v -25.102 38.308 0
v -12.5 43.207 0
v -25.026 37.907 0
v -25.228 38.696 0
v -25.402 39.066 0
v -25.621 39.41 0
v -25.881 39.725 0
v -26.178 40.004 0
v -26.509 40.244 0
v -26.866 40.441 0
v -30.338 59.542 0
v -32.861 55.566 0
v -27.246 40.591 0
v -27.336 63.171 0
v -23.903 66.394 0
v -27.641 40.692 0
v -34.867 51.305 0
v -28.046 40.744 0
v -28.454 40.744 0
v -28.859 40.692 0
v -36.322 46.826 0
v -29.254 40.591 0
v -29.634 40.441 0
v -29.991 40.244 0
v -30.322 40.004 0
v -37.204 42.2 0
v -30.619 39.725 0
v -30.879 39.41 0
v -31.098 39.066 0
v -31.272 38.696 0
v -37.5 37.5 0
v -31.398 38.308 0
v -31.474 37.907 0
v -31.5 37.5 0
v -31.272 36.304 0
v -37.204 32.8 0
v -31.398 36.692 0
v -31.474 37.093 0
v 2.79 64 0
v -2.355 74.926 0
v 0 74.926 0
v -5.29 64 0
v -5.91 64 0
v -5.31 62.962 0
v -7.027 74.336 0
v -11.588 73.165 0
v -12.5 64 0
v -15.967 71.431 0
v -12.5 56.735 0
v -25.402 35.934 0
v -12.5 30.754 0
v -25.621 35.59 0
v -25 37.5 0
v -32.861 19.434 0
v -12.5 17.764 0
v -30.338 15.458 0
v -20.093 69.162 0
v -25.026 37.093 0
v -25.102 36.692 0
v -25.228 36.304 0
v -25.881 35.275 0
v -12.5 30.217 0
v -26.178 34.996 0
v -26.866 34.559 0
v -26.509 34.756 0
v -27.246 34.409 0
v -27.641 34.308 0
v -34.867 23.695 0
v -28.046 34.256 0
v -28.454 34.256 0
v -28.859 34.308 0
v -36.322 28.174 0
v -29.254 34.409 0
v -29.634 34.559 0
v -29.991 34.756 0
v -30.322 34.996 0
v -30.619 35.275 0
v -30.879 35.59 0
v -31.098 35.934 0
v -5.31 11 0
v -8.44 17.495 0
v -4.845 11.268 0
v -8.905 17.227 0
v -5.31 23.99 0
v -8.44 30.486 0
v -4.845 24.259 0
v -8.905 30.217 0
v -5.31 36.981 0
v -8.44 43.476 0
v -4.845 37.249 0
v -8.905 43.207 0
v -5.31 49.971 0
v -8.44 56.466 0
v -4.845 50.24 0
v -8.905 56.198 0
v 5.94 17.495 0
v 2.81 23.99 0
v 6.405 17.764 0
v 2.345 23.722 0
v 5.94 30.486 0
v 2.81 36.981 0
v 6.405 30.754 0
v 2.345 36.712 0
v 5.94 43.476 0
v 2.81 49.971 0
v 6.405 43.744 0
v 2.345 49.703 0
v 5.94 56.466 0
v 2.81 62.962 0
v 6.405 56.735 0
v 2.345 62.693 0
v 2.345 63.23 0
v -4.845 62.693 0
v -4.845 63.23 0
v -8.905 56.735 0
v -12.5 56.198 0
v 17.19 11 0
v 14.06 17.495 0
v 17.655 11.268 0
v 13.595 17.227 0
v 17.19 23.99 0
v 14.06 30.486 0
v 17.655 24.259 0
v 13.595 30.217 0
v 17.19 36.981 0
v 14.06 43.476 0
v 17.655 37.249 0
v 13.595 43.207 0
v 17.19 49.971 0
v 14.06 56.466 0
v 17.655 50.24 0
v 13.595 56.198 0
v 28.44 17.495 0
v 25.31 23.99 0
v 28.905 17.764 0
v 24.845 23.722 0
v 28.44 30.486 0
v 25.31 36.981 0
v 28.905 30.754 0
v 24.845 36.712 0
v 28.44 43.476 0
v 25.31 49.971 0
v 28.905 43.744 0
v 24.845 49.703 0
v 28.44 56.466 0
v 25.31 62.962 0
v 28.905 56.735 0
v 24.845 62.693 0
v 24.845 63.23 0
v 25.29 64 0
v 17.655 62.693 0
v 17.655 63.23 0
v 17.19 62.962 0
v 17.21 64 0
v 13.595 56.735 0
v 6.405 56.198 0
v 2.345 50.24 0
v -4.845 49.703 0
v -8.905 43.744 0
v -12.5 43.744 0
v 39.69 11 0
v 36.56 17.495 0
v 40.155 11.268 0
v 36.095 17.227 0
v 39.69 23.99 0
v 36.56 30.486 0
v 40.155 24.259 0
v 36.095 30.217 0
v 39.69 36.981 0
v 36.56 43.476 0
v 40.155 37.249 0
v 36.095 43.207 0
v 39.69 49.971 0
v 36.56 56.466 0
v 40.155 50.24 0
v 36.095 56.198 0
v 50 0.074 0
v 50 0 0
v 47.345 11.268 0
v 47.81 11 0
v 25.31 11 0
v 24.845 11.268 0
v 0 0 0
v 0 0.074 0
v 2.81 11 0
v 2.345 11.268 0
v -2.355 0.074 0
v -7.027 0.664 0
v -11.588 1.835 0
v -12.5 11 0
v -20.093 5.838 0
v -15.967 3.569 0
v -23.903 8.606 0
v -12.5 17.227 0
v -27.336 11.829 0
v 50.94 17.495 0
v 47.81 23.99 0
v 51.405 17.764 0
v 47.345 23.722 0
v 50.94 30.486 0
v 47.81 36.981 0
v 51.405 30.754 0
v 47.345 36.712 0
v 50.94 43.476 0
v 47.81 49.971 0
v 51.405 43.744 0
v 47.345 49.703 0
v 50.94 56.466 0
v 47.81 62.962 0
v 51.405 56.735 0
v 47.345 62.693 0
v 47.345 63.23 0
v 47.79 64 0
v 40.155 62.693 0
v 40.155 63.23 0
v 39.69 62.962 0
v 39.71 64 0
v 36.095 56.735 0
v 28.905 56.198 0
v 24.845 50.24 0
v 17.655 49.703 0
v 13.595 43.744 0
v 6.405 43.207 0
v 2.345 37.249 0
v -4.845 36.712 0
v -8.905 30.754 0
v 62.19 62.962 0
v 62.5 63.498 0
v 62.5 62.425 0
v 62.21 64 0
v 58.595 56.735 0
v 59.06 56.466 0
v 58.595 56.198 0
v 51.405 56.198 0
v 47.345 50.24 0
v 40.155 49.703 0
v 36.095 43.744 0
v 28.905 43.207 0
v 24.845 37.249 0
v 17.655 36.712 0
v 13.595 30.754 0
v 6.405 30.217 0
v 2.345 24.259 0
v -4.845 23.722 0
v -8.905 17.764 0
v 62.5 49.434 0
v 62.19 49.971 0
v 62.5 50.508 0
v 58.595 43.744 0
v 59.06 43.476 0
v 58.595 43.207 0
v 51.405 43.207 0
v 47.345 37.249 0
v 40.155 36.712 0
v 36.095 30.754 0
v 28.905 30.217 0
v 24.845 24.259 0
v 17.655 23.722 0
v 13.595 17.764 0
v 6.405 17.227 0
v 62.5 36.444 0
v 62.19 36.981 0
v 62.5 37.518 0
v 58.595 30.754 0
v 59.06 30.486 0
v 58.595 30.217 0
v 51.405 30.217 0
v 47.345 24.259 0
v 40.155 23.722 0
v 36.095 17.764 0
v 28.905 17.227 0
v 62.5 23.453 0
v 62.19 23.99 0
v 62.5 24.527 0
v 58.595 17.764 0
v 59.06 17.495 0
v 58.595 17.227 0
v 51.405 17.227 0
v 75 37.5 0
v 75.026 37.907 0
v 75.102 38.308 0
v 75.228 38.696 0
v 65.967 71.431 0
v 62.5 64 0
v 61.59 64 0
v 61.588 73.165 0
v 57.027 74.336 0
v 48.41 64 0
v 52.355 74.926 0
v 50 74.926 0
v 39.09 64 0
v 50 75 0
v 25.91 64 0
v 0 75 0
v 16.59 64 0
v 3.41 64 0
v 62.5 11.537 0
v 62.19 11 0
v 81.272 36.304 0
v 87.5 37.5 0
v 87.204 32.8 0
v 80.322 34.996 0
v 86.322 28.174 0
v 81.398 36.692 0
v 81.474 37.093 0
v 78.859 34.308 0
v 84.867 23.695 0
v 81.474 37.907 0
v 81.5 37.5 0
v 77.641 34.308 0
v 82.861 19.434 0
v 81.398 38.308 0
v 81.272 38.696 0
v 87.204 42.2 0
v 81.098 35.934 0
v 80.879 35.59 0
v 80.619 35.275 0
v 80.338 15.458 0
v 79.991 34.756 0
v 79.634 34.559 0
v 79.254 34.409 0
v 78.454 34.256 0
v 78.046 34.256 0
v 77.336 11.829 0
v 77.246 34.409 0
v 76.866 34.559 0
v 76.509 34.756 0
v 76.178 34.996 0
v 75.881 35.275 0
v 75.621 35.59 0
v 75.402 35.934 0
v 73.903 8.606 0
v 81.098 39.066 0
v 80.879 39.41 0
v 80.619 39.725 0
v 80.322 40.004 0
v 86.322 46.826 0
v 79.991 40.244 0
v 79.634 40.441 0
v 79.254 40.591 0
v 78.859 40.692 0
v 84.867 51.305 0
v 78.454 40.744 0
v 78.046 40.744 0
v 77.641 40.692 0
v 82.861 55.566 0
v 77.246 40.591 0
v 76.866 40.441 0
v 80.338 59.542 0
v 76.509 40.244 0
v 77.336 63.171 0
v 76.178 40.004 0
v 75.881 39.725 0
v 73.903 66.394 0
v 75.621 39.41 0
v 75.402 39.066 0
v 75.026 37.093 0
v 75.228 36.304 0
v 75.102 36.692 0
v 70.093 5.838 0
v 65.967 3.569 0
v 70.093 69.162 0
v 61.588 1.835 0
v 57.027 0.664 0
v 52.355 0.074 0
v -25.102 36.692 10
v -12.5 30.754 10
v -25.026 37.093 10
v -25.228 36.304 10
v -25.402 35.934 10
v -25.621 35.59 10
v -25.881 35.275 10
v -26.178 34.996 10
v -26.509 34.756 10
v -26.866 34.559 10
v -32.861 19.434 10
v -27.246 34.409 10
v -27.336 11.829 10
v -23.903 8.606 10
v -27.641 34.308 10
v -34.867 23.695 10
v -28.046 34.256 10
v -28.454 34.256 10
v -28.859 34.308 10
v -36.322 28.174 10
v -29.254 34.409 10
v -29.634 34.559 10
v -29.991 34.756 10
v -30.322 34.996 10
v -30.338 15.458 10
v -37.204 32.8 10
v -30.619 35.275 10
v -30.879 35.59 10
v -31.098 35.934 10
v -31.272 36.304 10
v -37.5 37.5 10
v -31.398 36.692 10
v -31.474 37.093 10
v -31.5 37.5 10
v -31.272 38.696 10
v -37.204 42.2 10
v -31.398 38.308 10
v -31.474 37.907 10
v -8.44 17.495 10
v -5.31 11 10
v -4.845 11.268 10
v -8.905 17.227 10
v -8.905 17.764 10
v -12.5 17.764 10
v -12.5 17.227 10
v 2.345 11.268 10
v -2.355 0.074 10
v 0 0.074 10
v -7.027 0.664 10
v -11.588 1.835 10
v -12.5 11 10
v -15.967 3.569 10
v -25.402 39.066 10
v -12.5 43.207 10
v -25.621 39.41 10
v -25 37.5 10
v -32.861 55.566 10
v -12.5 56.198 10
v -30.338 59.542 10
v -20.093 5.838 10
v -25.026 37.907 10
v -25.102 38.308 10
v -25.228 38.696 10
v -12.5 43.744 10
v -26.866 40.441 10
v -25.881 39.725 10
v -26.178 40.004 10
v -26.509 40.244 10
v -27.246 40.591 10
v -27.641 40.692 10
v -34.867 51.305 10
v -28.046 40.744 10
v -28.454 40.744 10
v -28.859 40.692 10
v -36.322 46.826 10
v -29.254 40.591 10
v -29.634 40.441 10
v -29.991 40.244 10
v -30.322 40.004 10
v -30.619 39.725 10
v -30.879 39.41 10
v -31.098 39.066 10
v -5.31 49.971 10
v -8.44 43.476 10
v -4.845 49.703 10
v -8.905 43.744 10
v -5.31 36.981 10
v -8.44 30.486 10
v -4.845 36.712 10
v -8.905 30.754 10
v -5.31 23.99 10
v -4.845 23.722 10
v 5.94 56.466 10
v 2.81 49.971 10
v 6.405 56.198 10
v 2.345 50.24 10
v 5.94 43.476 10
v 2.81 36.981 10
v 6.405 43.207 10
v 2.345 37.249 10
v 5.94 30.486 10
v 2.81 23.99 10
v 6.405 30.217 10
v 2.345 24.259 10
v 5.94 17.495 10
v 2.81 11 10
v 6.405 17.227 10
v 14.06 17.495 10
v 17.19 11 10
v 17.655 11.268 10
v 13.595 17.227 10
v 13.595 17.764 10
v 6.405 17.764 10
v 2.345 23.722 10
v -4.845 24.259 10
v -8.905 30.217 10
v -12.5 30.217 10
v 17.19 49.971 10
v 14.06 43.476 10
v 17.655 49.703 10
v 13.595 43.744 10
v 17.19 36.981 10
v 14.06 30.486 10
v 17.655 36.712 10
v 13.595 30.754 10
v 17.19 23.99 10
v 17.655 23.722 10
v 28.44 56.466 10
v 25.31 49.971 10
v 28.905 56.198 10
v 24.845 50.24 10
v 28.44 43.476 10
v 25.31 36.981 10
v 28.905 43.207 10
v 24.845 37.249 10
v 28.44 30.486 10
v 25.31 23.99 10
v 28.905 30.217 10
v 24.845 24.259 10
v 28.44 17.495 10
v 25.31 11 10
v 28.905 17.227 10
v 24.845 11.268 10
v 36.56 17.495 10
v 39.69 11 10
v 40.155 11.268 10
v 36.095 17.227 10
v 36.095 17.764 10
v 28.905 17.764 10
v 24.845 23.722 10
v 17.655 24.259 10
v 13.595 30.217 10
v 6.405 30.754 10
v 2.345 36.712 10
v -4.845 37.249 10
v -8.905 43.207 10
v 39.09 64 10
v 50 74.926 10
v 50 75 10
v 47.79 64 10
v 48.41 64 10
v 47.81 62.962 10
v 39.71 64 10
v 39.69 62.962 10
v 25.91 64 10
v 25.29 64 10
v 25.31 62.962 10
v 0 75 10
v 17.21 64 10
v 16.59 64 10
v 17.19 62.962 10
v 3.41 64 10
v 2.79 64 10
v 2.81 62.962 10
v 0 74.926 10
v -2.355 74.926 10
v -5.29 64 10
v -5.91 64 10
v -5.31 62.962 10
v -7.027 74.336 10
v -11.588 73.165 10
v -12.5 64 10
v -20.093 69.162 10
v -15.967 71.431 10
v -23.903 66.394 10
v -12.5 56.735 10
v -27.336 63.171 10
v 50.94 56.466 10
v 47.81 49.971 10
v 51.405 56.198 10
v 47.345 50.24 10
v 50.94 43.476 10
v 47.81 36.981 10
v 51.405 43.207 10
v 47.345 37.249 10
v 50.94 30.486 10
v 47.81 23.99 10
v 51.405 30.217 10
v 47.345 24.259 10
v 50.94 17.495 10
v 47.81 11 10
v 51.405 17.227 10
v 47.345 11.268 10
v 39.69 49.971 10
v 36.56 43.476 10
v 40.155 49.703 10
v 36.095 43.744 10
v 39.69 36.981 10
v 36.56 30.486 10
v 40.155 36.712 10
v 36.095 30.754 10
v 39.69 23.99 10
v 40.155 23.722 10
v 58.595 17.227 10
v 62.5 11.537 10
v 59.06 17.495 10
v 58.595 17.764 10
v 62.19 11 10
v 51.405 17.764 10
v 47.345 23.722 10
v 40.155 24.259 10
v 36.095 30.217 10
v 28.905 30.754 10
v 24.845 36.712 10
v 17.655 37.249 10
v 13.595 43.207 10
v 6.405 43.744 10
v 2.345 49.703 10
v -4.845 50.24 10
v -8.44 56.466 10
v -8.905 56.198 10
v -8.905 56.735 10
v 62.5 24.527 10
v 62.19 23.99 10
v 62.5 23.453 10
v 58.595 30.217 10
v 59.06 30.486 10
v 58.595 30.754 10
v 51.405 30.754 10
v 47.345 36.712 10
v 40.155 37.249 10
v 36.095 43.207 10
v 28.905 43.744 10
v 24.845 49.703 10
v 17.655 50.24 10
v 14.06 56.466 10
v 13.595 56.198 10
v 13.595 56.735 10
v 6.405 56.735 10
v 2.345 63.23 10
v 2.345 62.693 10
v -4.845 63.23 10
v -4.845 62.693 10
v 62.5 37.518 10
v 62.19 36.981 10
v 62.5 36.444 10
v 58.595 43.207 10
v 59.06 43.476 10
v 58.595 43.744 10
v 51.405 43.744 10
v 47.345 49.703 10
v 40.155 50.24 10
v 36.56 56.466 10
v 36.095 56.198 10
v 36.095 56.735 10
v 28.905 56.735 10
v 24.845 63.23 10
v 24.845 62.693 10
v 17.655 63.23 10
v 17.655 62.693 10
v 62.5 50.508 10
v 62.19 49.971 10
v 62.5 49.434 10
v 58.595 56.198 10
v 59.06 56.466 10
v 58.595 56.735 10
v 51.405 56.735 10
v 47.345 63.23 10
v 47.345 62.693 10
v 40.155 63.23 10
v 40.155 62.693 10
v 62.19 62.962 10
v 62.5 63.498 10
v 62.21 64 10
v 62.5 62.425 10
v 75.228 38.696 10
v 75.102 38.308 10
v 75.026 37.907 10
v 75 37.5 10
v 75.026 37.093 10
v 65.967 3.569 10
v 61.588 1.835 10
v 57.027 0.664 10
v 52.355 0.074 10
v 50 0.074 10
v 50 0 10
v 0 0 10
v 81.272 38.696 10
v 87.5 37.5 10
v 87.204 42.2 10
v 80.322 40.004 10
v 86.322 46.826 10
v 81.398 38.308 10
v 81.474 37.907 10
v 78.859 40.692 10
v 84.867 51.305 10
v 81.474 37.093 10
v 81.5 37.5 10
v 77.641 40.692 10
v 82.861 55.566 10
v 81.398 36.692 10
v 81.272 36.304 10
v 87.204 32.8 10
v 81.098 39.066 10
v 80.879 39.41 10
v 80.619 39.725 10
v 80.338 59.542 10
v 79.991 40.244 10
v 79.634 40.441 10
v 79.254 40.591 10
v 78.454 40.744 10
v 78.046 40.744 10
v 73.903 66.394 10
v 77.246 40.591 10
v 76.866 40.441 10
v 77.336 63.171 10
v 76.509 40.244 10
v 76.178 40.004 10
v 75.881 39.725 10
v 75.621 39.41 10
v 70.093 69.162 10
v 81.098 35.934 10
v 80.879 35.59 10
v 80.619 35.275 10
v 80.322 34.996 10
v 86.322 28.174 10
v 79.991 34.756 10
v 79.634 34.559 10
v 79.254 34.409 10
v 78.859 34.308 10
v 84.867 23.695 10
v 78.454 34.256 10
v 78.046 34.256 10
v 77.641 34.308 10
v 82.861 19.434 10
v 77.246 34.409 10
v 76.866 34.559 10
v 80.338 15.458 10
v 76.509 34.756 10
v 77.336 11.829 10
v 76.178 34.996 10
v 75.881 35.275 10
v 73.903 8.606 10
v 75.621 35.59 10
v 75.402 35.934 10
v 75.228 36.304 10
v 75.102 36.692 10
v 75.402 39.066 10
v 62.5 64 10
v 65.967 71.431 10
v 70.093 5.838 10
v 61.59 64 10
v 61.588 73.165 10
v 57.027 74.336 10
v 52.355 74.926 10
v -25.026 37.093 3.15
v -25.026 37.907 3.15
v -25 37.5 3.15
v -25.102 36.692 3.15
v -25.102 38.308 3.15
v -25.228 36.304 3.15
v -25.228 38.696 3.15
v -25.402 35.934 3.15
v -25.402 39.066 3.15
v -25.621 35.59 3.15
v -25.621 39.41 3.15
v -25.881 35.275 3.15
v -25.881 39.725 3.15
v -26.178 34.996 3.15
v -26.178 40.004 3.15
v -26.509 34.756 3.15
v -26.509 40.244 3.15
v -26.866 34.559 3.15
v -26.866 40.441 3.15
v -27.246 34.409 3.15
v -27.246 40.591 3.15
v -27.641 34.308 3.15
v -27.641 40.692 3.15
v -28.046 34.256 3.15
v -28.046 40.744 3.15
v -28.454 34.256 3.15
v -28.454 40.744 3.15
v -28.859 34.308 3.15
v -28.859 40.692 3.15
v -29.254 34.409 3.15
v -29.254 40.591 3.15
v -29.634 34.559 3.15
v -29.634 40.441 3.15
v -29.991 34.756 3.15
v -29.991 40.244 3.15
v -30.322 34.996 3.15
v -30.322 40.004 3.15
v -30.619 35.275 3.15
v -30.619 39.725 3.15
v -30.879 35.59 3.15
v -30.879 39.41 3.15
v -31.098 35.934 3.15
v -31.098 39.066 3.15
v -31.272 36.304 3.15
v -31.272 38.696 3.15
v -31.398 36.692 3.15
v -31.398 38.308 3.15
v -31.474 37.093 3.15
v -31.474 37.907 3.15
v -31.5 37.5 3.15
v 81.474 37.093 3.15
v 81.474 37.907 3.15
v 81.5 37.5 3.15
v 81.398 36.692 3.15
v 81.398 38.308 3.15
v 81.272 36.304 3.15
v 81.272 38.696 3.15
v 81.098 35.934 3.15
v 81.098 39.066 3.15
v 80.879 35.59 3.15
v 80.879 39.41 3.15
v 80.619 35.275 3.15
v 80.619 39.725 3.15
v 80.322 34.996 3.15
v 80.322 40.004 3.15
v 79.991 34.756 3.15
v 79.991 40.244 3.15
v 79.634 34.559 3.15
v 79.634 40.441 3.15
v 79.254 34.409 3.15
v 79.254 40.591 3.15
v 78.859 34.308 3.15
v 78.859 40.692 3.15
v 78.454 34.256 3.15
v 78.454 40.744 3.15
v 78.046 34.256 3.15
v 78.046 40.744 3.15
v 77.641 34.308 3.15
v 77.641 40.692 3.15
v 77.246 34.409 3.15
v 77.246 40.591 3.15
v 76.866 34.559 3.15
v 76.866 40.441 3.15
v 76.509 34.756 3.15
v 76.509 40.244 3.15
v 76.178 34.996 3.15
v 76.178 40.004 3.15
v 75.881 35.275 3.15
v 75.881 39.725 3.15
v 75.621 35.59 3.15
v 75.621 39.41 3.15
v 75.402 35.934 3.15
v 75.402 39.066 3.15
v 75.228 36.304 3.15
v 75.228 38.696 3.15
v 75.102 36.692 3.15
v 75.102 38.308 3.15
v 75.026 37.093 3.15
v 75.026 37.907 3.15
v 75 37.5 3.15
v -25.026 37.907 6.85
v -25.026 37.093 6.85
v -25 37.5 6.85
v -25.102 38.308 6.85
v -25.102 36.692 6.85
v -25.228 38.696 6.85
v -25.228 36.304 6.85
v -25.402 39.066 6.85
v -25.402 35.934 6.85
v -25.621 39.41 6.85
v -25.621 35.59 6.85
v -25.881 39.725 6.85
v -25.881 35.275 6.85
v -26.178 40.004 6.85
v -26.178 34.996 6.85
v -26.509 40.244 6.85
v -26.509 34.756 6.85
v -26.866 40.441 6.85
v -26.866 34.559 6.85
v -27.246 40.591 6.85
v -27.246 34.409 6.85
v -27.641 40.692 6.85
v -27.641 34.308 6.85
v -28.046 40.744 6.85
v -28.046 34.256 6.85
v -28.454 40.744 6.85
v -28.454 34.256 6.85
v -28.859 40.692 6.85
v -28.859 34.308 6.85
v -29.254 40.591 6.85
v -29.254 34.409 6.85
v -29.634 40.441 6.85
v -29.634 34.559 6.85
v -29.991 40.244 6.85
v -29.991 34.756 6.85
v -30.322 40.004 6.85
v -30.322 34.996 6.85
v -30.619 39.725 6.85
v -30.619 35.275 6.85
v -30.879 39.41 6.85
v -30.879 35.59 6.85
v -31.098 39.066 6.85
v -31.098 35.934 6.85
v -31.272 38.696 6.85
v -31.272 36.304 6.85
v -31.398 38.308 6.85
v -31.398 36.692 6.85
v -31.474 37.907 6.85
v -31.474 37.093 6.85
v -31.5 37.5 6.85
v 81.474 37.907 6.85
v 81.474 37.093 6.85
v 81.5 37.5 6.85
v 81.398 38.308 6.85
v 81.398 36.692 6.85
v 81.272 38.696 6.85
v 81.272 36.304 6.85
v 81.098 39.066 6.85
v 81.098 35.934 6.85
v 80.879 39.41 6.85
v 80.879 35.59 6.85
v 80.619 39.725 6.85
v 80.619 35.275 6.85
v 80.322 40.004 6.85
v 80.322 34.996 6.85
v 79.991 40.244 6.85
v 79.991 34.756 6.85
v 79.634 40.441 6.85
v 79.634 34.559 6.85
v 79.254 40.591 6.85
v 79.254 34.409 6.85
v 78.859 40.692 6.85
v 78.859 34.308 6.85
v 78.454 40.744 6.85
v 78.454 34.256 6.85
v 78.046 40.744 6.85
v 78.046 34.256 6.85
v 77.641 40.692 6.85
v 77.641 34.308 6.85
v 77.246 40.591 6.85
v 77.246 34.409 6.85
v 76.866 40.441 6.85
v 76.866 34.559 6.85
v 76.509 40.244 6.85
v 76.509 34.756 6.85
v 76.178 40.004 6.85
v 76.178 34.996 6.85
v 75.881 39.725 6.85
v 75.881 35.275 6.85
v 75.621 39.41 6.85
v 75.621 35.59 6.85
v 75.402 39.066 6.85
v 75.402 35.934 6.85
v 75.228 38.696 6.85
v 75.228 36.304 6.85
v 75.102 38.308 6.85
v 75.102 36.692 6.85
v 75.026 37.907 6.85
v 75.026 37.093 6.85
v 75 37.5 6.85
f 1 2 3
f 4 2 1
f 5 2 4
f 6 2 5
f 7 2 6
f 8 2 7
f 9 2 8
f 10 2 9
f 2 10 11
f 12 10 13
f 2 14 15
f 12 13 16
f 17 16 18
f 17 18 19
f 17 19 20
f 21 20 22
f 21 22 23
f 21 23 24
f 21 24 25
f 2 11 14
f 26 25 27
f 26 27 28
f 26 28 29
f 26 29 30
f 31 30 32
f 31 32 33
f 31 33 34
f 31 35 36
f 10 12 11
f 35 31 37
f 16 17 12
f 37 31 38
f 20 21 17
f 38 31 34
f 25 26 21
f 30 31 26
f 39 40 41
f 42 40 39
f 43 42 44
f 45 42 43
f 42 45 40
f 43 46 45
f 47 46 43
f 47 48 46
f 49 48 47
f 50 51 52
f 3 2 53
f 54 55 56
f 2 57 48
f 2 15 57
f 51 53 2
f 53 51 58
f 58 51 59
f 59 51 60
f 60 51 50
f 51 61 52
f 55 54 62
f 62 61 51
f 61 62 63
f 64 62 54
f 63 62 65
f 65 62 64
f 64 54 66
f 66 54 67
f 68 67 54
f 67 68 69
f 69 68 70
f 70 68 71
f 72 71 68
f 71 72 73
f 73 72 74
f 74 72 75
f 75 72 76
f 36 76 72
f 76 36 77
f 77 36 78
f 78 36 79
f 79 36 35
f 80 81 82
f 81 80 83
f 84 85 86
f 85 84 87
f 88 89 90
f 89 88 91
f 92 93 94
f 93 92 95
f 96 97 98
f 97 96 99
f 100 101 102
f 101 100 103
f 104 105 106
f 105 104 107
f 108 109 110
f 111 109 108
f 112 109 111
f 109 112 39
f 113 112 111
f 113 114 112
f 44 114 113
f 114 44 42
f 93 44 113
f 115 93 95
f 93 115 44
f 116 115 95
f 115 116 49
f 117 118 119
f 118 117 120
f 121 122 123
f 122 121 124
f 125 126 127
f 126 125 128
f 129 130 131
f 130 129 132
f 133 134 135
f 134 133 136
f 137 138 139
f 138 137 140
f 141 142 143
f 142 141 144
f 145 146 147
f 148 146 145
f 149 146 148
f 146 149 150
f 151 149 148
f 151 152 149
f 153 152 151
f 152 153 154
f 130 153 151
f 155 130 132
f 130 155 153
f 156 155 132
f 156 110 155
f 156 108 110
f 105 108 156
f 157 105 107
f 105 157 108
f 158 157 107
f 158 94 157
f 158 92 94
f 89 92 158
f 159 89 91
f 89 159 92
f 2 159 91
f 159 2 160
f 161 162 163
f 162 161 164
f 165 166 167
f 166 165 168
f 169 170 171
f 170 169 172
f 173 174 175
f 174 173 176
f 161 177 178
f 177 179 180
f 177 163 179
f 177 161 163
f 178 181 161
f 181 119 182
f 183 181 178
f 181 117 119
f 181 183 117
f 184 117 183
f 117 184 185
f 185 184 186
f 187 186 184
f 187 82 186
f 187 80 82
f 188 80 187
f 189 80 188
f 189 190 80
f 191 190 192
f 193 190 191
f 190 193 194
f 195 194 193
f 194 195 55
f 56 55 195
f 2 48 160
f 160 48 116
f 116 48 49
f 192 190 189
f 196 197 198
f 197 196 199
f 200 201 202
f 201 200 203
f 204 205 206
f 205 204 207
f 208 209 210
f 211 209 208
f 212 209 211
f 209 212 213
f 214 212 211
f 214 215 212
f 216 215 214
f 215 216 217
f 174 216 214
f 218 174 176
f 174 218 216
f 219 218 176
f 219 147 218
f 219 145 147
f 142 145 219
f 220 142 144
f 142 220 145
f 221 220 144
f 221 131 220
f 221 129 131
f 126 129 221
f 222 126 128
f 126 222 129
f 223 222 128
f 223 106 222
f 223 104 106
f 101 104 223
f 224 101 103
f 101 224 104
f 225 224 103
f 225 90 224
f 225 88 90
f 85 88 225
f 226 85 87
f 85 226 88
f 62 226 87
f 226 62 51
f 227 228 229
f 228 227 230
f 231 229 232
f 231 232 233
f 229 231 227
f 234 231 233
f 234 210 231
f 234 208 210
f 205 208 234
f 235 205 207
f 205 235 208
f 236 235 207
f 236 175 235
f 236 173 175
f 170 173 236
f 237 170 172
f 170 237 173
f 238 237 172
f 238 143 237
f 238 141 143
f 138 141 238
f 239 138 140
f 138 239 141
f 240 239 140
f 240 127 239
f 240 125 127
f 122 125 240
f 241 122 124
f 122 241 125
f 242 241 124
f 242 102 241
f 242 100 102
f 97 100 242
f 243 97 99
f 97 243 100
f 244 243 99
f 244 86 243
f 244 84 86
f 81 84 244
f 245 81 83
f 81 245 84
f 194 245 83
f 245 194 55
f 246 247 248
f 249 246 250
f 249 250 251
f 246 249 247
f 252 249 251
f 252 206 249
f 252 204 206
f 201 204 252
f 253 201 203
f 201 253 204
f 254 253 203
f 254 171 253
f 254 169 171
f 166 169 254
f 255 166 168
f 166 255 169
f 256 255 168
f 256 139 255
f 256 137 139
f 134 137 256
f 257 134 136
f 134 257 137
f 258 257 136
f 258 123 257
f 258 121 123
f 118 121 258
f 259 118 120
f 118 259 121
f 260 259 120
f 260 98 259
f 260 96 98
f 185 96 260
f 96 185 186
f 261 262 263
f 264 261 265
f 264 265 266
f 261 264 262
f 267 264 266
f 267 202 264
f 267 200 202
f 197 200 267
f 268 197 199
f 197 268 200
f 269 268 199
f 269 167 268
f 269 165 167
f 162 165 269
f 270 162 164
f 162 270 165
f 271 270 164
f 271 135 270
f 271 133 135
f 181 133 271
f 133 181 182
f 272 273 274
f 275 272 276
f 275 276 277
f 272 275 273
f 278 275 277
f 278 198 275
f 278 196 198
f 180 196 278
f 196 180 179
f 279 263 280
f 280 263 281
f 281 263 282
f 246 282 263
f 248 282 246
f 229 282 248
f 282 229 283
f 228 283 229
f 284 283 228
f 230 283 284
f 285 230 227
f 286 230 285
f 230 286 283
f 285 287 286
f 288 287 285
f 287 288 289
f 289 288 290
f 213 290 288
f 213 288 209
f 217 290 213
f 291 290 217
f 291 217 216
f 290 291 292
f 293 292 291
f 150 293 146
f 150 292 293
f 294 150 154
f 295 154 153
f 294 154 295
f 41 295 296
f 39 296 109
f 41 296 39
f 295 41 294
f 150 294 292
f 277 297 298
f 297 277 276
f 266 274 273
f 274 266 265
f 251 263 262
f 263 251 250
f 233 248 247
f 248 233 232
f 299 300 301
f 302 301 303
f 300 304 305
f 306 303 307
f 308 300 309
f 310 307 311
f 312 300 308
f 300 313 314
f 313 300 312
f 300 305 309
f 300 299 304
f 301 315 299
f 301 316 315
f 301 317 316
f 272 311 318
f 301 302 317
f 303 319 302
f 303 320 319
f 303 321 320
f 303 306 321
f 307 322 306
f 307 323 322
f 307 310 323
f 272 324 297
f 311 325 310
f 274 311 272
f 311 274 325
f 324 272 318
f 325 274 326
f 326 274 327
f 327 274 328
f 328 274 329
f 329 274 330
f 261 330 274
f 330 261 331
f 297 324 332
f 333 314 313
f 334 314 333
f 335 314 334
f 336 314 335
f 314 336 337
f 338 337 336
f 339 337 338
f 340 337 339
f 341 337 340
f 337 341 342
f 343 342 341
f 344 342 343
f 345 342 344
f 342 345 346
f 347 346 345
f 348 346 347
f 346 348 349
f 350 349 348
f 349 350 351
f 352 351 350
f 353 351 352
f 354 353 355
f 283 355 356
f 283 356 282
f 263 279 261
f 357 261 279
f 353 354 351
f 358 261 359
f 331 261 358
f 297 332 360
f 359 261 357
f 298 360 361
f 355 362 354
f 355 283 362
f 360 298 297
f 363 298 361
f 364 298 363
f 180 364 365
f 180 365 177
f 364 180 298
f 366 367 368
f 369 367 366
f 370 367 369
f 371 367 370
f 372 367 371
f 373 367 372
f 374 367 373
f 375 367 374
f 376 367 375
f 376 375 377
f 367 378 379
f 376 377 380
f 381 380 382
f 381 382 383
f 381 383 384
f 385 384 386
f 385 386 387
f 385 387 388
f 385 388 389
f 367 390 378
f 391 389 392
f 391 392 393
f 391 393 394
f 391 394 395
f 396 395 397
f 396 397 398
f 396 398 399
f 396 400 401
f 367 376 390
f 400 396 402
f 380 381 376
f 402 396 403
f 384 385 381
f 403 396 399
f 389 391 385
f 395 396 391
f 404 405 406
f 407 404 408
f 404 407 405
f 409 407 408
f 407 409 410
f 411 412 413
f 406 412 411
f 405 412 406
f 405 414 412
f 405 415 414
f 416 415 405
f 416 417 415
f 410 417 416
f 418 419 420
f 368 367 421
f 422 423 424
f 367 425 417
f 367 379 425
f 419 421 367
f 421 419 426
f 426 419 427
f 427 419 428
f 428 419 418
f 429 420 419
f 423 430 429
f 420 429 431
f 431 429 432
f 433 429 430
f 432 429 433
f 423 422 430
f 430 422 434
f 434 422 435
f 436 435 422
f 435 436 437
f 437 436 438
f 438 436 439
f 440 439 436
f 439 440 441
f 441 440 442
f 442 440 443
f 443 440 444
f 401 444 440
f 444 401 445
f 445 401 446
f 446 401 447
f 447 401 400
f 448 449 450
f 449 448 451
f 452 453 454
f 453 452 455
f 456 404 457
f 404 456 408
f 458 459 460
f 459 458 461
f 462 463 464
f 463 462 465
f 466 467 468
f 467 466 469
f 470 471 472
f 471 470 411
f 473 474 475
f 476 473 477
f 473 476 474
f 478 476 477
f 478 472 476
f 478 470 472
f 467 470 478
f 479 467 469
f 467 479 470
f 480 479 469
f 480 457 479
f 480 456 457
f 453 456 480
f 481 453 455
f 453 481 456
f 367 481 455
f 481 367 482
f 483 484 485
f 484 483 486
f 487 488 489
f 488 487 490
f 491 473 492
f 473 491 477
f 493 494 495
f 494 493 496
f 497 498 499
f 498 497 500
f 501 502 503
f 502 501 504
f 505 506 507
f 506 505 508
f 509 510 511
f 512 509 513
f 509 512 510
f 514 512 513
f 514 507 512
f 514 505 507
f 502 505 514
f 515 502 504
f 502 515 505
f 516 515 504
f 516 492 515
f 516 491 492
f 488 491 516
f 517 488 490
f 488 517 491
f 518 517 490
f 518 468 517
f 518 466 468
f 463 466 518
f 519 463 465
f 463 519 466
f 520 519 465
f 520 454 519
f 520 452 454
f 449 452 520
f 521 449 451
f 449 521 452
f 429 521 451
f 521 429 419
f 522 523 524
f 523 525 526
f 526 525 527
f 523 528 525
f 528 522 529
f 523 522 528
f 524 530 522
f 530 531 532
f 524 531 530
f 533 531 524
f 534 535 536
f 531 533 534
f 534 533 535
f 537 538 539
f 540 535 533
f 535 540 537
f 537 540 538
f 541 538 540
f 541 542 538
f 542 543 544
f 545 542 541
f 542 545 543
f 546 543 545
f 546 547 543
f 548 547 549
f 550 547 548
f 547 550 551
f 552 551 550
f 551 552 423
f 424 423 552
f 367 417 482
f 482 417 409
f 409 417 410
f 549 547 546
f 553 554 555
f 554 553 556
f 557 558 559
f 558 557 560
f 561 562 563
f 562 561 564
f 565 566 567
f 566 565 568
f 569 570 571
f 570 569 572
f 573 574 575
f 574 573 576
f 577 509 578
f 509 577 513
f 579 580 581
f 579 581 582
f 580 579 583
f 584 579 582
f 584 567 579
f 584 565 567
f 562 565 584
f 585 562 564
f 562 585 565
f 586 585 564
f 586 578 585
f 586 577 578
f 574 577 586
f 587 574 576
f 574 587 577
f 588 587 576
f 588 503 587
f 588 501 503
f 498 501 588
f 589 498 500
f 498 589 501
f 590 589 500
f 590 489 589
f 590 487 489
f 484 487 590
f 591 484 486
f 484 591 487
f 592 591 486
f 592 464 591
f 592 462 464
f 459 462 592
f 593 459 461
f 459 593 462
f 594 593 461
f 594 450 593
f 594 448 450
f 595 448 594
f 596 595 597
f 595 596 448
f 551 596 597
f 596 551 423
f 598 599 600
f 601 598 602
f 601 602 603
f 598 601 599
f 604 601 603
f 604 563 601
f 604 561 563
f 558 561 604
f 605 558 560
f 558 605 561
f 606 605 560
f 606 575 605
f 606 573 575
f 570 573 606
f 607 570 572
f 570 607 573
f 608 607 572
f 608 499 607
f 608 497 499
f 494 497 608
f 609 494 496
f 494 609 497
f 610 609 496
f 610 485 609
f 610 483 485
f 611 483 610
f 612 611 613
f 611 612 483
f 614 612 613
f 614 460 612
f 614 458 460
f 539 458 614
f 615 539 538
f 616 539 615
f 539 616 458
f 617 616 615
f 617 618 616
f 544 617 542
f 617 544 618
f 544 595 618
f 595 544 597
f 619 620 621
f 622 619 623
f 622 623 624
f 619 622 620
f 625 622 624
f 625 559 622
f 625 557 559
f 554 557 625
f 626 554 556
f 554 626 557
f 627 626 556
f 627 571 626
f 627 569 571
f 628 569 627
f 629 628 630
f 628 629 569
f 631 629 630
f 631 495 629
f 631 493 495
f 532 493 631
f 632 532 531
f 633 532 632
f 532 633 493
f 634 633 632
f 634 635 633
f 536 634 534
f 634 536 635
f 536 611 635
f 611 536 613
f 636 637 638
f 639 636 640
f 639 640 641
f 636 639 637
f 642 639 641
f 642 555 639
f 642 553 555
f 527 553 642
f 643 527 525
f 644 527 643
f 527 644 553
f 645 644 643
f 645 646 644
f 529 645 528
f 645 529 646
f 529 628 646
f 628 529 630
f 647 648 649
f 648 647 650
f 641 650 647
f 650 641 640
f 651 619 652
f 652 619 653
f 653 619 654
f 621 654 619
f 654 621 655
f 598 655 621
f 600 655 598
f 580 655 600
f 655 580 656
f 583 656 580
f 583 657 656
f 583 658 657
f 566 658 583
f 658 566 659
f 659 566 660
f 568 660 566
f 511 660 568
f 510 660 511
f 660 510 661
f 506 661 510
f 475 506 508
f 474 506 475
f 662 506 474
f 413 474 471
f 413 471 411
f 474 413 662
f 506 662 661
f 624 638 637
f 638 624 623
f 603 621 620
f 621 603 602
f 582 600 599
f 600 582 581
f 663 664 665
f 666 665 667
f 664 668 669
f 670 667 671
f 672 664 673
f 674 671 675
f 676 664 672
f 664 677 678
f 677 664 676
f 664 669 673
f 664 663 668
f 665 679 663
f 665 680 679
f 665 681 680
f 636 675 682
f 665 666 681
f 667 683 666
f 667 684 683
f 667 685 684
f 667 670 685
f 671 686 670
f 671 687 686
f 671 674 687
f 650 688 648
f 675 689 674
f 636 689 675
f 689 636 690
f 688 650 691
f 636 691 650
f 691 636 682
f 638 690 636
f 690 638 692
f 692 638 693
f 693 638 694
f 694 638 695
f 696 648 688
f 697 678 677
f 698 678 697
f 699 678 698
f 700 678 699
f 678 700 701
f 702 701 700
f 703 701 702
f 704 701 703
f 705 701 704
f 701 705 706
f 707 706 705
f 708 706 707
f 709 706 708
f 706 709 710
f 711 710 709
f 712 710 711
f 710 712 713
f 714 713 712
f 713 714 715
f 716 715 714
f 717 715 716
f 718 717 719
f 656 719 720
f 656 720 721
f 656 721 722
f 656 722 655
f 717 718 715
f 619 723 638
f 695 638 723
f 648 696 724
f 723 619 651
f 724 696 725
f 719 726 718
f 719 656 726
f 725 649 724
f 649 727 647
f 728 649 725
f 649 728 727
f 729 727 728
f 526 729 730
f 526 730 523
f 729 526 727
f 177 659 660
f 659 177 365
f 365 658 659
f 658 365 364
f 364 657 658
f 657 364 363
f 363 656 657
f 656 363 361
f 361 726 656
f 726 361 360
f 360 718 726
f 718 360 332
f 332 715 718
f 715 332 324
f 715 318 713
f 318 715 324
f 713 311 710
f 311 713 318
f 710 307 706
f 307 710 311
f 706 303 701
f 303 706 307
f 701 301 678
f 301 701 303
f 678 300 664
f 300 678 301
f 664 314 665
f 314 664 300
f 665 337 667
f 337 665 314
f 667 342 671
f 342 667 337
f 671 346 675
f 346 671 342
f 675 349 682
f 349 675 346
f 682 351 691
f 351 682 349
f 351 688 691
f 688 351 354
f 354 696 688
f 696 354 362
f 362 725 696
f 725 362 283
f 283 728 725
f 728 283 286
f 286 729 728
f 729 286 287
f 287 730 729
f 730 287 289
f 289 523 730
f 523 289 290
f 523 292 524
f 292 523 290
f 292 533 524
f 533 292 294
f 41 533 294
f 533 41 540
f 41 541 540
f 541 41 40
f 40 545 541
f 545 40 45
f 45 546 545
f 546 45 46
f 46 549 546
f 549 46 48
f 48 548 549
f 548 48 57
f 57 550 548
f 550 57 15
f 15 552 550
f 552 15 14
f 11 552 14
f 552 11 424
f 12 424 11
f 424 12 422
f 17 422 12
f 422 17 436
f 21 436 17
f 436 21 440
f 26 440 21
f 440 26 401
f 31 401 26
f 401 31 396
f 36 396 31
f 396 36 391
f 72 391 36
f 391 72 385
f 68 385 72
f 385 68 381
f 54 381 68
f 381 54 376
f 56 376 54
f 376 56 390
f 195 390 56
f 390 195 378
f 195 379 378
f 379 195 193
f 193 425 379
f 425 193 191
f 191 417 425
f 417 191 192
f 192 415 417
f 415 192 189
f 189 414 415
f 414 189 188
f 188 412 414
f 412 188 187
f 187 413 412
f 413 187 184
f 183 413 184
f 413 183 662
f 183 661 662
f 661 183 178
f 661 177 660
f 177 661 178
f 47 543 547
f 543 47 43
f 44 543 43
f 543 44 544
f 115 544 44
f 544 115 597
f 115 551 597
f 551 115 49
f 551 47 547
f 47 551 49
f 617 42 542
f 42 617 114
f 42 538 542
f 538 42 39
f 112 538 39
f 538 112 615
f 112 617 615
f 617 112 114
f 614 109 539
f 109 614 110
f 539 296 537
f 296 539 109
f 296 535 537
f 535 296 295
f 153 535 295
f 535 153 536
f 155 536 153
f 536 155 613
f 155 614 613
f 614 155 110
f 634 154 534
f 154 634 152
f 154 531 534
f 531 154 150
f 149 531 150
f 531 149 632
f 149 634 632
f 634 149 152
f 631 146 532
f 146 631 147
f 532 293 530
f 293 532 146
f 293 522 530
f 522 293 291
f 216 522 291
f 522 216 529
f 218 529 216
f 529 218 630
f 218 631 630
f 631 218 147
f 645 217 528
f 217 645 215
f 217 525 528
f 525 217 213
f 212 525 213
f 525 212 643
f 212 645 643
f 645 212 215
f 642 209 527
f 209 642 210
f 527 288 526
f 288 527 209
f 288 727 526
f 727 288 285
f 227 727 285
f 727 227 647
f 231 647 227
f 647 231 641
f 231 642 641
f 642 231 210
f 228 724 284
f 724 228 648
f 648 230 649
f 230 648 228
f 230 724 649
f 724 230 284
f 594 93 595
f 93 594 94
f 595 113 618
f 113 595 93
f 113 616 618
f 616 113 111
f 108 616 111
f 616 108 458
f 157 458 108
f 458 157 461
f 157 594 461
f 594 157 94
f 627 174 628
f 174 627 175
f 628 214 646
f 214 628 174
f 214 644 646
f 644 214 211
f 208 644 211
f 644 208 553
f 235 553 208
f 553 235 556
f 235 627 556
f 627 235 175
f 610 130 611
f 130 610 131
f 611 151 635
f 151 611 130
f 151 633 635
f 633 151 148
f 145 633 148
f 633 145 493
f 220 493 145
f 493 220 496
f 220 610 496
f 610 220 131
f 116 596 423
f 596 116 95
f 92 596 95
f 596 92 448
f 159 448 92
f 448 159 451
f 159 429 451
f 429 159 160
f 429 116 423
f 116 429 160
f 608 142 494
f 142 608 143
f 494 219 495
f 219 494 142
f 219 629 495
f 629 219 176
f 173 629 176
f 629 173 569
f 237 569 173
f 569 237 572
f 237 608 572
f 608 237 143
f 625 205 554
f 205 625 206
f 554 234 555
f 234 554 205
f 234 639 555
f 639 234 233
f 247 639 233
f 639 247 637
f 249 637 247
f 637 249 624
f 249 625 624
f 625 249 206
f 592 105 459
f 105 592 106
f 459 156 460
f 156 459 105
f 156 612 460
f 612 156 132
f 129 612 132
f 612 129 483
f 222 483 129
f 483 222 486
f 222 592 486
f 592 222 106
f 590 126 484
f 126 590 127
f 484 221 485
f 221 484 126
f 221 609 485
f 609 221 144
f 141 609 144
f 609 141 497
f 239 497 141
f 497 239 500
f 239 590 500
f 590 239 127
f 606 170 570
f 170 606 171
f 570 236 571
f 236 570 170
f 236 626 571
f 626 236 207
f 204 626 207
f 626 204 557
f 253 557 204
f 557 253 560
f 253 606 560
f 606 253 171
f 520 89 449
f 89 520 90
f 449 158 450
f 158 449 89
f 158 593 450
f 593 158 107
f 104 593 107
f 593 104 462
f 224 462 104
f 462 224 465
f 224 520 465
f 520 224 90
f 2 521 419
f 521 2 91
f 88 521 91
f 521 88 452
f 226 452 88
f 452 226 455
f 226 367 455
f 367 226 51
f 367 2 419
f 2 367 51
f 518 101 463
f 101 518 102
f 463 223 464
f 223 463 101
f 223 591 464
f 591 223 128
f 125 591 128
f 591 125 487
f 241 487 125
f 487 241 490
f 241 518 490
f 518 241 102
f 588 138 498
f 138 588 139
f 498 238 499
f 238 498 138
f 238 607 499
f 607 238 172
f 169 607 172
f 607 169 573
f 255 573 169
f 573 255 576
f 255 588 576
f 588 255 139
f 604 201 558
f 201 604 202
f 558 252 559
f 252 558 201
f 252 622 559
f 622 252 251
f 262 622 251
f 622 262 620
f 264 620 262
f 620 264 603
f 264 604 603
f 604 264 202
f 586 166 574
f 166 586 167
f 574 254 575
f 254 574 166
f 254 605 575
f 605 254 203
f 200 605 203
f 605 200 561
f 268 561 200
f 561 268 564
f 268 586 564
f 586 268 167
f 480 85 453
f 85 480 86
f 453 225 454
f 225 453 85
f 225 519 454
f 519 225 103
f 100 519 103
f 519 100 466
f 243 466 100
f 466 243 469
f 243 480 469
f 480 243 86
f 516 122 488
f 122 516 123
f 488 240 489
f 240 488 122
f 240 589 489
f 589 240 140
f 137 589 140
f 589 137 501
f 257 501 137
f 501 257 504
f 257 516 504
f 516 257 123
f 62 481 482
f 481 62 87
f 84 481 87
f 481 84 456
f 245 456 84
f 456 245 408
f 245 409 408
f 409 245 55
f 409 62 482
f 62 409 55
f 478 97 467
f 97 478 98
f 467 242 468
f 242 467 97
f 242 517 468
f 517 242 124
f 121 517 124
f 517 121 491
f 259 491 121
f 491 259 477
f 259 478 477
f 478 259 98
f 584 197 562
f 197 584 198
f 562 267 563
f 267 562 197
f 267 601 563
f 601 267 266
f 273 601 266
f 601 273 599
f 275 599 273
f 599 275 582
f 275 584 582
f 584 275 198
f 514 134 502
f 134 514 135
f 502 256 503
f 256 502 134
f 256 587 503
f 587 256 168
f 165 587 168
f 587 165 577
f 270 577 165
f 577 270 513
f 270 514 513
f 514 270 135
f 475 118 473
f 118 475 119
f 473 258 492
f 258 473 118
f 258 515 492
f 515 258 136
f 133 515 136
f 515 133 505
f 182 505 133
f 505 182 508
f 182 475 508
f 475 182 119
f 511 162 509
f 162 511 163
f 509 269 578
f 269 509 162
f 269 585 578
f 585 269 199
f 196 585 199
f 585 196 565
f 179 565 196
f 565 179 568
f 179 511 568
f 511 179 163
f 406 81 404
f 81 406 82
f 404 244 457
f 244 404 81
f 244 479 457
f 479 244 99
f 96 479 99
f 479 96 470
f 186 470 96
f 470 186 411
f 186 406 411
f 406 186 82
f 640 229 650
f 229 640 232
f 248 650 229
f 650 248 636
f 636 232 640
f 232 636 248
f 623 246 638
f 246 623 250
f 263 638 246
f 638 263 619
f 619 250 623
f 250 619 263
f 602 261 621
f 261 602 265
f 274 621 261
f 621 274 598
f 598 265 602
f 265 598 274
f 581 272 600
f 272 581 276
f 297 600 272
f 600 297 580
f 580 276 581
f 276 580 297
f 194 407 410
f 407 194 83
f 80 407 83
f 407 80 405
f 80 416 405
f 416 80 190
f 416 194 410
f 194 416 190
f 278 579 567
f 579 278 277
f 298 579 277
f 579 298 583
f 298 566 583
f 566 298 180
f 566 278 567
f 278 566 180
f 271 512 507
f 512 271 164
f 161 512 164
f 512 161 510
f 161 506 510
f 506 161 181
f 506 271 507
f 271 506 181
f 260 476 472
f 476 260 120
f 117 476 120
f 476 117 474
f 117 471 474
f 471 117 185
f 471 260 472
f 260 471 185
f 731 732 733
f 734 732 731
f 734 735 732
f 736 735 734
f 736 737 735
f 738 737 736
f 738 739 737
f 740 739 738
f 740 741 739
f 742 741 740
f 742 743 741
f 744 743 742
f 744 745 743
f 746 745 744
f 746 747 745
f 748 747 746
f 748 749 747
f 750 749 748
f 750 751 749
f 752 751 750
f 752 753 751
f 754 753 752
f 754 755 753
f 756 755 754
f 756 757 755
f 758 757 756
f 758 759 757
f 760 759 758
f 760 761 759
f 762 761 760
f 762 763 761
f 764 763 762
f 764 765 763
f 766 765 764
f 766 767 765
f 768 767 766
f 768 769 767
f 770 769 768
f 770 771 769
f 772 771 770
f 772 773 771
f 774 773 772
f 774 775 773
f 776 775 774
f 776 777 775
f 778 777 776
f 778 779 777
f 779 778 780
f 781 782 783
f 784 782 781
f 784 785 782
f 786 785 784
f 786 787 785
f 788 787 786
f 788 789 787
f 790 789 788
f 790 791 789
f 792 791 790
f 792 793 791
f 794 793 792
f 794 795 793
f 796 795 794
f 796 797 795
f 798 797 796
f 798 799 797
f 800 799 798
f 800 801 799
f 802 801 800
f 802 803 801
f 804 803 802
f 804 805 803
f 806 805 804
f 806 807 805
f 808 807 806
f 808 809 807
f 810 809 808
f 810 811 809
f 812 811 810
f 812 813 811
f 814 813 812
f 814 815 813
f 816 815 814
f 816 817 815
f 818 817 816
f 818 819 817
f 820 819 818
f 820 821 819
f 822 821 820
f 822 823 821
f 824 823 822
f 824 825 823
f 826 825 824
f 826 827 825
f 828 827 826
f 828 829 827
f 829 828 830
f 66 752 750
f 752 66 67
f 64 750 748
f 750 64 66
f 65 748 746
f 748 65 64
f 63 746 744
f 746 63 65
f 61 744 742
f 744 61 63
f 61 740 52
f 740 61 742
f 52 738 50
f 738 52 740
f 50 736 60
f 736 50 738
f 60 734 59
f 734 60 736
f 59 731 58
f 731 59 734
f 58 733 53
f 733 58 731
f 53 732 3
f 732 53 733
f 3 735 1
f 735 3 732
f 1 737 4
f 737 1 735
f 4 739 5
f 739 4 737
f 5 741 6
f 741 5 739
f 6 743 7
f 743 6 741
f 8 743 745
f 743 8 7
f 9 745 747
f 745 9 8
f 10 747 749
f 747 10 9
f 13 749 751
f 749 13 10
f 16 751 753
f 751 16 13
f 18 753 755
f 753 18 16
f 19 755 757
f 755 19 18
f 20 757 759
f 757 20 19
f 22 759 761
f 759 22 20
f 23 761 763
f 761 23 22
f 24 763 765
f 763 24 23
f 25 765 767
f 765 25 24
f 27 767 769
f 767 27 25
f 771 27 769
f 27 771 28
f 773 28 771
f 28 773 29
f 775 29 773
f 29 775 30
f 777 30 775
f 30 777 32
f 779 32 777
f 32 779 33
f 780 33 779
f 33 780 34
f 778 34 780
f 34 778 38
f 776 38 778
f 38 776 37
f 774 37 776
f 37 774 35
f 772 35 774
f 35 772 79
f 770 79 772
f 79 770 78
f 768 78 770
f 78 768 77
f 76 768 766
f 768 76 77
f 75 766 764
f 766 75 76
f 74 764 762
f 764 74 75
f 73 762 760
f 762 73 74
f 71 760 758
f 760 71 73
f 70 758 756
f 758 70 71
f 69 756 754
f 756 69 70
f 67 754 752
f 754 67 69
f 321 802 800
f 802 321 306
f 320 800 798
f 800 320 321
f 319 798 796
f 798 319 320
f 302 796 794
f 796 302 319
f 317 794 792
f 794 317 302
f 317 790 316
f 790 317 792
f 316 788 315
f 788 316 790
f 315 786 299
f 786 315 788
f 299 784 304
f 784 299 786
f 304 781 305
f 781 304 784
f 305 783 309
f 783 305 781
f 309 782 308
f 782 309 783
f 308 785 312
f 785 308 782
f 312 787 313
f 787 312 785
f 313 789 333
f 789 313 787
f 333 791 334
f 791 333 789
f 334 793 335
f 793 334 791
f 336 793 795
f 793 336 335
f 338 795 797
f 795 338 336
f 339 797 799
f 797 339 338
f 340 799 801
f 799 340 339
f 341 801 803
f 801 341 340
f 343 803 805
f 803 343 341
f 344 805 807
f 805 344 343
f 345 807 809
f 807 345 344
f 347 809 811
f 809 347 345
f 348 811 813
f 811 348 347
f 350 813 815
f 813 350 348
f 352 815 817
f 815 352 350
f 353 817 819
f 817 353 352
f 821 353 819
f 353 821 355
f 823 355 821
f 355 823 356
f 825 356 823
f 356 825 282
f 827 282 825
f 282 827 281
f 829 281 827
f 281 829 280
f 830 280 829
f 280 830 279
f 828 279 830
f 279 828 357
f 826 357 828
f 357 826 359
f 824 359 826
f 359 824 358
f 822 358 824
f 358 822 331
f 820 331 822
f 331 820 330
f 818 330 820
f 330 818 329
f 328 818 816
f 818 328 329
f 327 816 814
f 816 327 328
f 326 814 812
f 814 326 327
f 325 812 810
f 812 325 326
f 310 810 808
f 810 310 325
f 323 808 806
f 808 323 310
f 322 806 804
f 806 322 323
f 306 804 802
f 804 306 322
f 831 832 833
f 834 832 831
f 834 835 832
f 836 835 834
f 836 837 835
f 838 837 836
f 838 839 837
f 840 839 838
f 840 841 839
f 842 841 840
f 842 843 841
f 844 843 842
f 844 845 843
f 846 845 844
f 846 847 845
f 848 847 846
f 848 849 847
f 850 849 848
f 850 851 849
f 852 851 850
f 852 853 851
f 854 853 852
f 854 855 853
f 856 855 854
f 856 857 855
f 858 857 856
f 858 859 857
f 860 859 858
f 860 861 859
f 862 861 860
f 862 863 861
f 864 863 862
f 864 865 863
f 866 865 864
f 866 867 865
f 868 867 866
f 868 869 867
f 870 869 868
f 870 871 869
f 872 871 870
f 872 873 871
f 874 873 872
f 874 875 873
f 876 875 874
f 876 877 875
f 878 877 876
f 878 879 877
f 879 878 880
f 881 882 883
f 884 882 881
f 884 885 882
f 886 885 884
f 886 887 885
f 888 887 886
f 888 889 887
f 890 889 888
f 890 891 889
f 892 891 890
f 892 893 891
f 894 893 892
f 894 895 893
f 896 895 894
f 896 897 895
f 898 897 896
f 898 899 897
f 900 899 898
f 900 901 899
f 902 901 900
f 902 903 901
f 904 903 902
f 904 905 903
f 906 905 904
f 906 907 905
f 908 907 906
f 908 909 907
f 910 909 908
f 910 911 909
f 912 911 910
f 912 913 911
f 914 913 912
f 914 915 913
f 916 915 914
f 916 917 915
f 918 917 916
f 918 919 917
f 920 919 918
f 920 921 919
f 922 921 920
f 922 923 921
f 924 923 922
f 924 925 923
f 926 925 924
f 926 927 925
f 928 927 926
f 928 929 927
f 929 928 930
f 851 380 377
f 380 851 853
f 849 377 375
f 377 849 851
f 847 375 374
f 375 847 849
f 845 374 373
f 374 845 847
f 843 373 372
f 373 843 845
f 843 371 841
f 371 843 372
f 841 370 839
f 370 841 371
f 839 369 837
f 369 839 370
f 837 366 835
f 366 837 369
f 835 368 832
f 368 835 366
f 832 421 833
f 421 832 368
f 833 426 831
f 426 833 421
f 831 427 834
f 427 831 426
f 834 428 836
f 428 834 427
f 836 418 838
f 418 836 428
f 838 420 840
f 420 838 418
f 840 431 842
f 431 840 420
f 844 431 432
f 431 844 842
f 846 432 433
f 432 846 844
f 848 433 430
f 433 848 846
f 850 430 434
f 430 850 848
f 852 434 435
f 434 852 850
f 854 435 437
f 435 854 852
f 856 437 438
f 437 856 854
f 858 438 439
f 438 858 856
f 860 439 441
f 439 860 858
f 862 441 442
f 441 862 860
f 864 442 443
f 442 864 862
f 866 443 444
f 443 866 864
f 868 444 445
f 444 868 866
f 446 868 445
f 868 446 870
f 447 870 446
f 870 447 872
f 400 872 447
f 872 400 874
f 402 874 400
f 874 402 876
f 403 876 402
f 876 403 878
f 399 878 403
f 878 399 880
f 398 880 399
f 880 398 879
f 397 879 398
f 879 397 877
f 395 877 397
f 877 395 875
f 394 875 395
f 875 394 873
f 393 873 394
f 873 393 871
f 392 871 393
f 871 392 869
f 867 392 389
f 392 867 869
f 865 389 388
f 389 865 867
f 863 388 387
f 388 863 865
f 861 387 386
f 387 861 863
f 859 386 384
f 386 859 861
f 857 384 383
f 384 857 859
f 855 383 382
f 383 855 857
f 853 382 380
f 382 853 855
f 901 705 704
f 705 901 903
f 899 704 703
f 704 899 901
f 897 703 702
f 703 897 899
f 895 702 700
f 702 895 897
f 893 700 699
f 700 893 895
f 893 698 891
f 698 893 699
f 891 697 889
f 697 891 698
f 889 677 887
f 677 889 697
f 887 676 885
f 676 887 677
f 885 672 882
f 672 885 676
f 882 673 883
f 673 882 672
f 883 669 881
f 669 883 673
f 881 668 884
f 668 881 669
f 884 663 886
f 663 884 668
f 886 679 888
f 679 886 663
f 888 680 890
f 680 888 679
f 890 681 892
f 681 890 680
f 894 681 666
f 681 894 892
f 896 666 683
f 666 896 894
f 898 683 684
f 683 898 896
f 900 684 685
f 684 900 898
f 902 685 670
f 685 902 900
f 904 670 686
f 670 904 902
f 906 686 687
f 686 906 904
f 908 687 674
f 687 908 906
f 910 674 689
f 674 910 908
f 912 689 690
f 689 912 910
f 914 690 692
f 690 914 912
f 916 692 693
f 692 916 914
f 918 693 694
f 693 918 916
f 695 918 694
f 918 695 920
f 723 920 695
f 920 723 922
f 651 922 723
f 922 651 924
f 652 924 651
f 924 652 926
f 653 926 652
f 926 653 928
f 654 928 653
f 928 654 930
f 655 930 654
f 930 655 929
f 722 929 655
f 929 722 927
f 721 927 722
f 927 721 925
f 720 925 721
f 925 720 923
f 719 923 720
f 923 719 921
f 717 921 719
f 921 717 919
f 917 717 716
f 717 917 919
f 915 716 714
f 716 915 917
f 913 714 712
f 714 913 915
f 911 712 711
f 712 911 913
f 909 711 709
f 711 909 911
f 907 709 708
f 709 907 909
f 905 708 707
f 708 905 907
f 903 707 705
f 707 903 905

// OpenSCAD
//////////////////////
/// Thing: Customizable Grid for Canon Speedlight
/// For use with http://www.thingiverse.com/thing:1185771 (Canon Speedlite 600EX-RT - CGprods KIT)
/// Author: Kim Quermann
/// Creative Commons - Attribution - just provide cedit to this thing
//////////////////////


/////////////////////
/// Change these Parameters
/////////////////////
twoSidedHole = "yes";
hexRadius=7.5;
showHexRadiusAsLabel = "no";

////////////////////
/// Nothing to change for Speedlight
////////////////////
outerWidth = 125;
outerHeight = 75;
outerRadius = outerHeight/2;
baseHeight = 10;
innerWidth = 75;
innerHeight = 53; // maybe 47 
holeDiameter = 6.5;
holeDepth = 3.15;
holeDistance = 6+0.5*holeDiameter;
hexBorderWidth=0.31; // be careful with this value. For too little value, the grid will not be printed. Min Value: 0.29 for shell thickness 1.5 in Cura

yStepHeight=2*sqrt(3/4*hexRadius*hexRadius);
xStepWidth=2*hexRadius*0.75;


///////////////
// RENDER

union(){
    
    difference(){
    linear_extrude( height = baseHeight)
        assembledGrid();
    linear_extrude(height = holeDepth)
        magnetHoles();
    if (twoSidedHole == "yes"){
        translate([0,0,baseHeight-holeDepth]) linear_extrude(height = holeDepth)
        magnetHoles();
        }  
    }
    
    if(showHexRadiusAsLabel == "yes"){
    rotate(a=[90,0,0])
    translate([5,5,0])
    linear_extrude(height = 1.5){
        text(text = str(hexRadius, " mm"), font = "Liberation Sans", size = 7, valign = "center");
    }
}
}
   



//////////////
// MODULES

module assembledGrid(){
    union(){
        baseShape();

        // Gesamt: outerWidth
        // Mittelpunkt(X):  (outerWidth-2*outerRadius)*0,5
        // mesh muss 0.5*Meshbreite nach links vom Mittelpunkt
        
       translate([outerRadius-(outerWidth-innerWidth),(outerHeight-innerHeight)/2]) mesh();
        }
    }

module baseShape(){
    difference(){
        union(){
            square([outerWidth-2*outerRadius,outerHeight]);
            translate([0,outerRadius,0]) circle(r=outerRadius, $fn=50);
            translate([outerWidth-2*outerRadius,outerRadius,0]) circle(r=outerRadius, $fn=50);
        }
        translate([outerRadius-(outerWidth-innerWidth),(outerHeight-innerHeight)/2])
        innerShape();
    }
}
module innerShape(add=0){
    square([innerWidth+add,innerHeight+add]);
    }
module magnetHoles(){
    translate([-outerRadius + holeDistance, outerRadius, 0]) circle(d=holeDiameter, $fn=50);
    translate([outerWidth-outerRadius-holeDistance, outerRadius,0]) circle(d=holeDiameter, $fn=50);
    }
    
module hex(x,y){
    
    
//    // Example mesh
//    hex(0*xStepWidth, 0*yStepHeight);
//    hex(1*xStepWidth, 0*yStepHeight + 0.5*yStepHeight);
//    hex(2*xStepWidth, 0*yStepHeight);
//    hex(3*xStepWidth, 0*yStepHeight + 0.5*yStepHeight);
//    hex(4*xStepWidth, 0*yStepHeight);
//    hex(5*xStepWidth, 0*yStepHeight + 0.5*yStepHeight);
//    hex(6*xStepWidth, 0*yStepHeight);
//    hex(7*xStepWidth, 0*yStepHeight + 0.5*yStepHeight);
//    // second row
//    hex(0*xStepWidth, 1*yStepHeight);
//    hex(1*xStepWidth, 1*yStepHeight +0.5*yStepHeight);
//    hex(2*xStepWidth, 1*yStepHeight);
//    hex(3*xStepWidth, 1*yStepHeight + 0.5*yStepHeight);
//    hex(4*xStepWidth, 1*yStepHeight);
//    hex(5*xStepWidth, 1*yStepHeight +0.5*yStepHeight);
//    hex(6*xStepWidth, 1*yStepHeight);
//    hex(7*xStepWidth, 1*yStepHeight + 0.5*yStepHeight);
//    // third row
//    hex(0*xStepWidth, 2*yStepHeight);
//    hex(1*xStepWidth, 2*yStepHeight +0.5*yStepHeight);
//    hex(2*xStepWidth, 2*yStepHeight);
//    hex(3*xStepWidth, 2*yStepHeight + 0.5*yStepHeight);
//    hex(4*xStepWidth, 2*yStepHeight);
//    hex(5*xStepWidth, 2*yStepHeight +0.5*yStepHeight);
//    hex(6*xStepWidth, 2*yStepHeight);
//    hex(7*xStepWidth, 2*yStepHeight + 0.5*yStepHeight);
    
    
	difference(){
		translate([x,y,0]) 
		circle(r=(hexRadius+hexBorderWidth), $fn=6);	
		translate([x,y,0]) 
		circle(r=(hexRadius-hexBorderWidth), $fn=6);
	}
}    
    
module mesh(){   
    xSteps = innerWidth / xStepWidth;
    ySteps = innerHeight / yStepHeight;
    intersection(){
        for (yi=[0:1:ySteps])
            for(xi=[0:1:xSteps]){
                hex(xi*xStepWidth,yi*yStepHeight+( xi%2==0?0:0.5*yStepHeight ));
            }
        innerShape();
    }
}

